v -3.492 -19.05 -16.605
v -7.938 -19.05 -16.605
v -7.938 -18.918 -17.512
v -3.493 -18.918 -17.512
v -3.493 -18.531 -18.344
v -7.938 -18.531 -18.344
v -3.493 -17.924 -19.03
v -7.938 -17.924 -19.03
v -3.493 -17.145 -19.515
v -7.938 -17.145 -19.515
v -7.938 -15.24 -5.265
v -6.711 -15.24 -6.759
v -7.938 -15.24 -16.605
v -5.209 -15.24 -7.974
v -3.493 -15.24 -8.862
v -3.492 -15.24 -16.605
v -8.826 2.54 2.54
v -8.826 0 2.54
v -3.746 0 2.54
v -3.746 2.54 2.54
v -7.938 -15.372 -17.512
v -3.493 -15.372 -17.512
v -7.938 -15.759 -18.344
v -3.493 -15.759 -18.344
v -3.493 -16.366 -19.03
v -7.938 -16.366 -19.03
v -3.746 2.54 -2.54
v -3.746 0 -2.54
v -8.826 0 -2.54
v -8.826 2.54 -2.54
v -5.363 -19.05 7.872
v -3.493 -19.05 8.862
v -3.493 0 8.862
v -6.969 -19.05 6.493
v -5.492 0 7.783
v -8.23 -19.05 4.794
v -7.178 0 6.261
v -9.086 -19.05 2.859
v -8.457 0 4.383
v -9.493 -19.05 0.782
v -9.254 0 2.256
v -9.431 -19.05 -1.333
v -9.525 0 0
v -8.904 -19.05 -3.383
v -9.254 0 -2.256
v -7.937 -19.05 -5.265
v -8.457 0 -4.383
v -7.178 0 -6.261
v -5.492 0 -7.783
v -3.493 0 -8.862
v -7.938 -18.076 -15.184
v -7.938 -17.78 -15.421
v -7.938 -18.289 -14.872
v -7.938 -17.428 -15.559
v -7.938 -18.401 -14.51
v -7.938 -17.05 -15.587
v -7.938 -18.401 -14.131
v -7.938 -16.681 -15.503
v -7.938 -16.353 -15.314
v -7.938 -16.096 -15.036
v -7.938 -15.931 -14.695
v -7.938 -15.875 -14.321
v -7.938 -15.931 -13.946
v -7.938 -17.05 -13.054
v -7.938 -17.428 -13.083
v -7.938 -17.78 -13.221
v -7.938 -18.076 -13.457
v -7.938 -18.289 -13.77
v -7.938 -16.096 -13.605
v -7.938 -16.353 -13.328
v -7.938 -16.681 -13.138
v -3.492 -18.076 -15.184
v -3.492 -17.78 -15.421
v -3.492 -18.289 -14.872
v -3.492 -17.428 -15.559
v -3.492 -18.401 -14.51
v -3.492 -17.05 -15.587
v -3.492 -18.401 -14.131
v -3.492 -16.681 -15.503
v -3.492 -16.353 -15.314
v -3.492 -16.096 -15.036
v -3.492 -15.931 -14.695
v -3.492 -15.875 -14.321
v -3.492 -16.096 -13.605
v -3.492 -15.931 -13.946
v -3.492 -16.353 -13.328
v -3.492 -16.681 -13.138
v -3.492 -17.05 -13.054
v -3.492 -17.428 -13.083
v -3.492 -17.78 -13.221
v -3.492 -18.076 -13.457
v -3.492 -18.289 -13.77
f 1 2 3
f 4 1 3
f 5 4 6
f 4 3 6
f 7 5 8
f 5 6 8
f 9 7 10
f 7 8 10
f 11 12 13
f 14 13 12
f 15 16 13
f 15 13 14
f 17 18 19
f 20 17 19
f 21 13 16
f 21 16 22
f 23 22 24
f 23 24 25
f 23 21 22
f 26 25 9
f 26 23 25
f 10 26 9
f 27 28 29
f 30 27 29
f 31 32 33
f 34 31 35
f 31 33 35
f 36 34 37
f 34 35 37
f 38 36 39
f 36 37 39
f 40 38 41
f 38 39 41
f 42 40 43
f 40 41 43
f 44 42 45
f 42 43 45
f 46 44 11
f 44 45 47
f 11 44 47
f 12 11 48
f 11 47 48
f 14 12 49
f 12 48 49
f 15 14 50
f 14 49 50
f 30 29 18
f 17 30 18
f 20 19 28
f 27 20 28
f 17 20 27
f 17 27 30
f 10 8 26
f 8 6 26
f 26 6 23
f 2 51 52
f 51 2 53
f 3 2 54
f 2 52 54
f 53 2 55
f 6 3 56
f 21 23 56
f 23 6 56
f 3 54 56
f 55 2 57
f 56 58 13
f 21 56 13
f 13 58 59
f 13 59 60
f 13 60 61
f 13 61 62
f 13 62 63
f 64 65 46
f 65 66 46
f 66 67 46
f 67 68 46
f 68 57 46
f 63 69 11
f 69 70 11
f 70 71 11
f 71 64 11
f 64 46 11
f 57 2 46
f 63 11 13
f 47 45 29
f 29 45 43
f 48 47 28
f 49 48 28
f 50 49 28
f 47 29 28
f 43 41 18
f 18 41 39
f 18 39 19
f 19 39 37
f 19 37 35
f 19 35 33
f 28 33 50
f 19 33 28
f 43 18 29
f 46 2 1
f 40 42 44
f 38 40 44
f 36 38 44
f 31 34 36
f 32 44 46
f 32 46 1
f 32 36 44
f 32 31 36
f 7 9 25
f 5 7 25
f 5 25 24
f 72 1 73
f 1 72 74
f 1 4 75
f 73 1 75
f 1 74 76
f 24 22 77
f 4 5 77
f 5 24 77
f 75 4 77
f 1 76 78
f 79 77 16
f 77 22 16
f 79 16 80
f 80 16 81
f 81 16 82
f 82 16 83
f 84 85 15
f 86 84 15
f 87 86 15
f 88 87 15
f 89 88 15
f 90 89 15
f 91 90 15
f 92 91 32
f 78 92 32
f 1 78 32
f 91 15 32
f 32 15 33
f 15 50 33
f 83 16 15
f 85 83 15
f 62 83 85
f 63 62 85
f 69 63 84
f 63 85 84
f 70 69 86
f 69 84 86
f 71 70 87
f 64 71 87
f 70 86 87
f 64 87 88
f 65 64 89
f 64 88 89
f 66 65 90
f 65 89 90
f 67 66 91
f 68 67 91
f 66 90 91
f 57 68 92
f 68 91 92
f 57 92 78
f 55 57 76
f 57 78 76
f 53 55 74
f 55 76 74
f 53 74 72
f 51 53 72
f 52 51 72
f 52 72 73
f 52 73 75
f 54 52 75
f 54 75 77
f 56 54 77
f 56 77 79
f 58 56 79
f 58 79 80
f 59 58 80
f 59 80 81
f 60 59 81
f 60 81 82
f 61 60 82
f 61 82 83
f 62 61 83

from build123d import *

# Parameters (mm, degrees)
F1_DEPTH    = 19.05
F3_DEPTH    = 2.54
F5_DEPTH    = 4.445
F6_R        = 1.27
F7_DEPTH    = 25.4
F8_T1_DEPTH = 20.32


# Not quite as in the source:
# - a fillet or chamfer that OpenCascade refuses, or shapes differently, is made with other operations: its cross-section is extruded or revolved along the edge and cut away or added


with BuildPart() as f1:
    # F0 (on Front) → F1 (new body)
    with BuildSketch(Plane.XZ):
        with BuildLine():
            Line((-3.4925, 0), (-3.4925, 8.861606443))
            ThreePointArc((-3.4925, 8.861606443), (-9.525, 0), (-3.4925, -8.861606443))
            Line((-3.4925, -8.861606443), (-3.4925, 0))
        make_face()
    extrude(amount=F1_DEPTH)

    # F2 (on face) → F3 (join)
    with BuildSketch(Plane(origin=(0, 0, 0), x_dir=(-1, 0, 0), z_dir=(0, 1, 0))):
        Polygon((3.7465, 2.54), (3.7465, 0), (3.7465, -2.54), (8.8265, -2.54), (8.8265, 2.54), align=None)
    extrude(amount=F3_DEPTH)

    # F4 (on face) → F5 (join)
    with BuildSketch(Plane.YZ.offset(-3.4925)):
        Polygon((-19.05, -2.0384269301), (-19.05, -8.861606443), (-19.05, -19.779715687), (-15.24, -19.779715687), (-15.24, -8.861606443), (-15.24, -2.0384269301), align=None)
    extrude(amount=-F5_DEPTH)

    # F6 (on face) → F7 (cut)
    with BuildSketch(Plane.YZ.offset(-3.4925)):
        with Locations((-17.145, -14.320661065)):
            Circle(F6_R)
    extrude(amount=-F7_DEPTH, mode=Mode.SUBTRACT)

    # F8: fillet of radius 3.175 on 2 edges, made by hand

    # F8_s2 → F8_t1 (cut)
    with BuildSketch(Plane.YZ.offset(-15.875)):
        with BuildLine():
            ThreePointArc((-15.24, -16.604715687), (-16.1699359697, -18.8497797173), (-18.415, -19.779715687))
            Line((-18.415, -19.779715687), (-15.24, -19.779715687))
            Line((-15.24, -19.779715687), (-15.24, -16.604715687))
        make_face()
        with BuildLine():
            ThreePointArc((-19.05, -16.604715687), (-18.1200640303, -18.8497797173), (-15.875, -19.779715687))
            Line((-15.875, -19.779715687), (-19.05, -19.779715687))
            Line((-19.05, -19.779715687), (-19.05, -16.604715687))
        make_face()
    extrude(amount=F8_T1_DEPTH, mode=Mode.SUBTRACT)


solid = f1.part
